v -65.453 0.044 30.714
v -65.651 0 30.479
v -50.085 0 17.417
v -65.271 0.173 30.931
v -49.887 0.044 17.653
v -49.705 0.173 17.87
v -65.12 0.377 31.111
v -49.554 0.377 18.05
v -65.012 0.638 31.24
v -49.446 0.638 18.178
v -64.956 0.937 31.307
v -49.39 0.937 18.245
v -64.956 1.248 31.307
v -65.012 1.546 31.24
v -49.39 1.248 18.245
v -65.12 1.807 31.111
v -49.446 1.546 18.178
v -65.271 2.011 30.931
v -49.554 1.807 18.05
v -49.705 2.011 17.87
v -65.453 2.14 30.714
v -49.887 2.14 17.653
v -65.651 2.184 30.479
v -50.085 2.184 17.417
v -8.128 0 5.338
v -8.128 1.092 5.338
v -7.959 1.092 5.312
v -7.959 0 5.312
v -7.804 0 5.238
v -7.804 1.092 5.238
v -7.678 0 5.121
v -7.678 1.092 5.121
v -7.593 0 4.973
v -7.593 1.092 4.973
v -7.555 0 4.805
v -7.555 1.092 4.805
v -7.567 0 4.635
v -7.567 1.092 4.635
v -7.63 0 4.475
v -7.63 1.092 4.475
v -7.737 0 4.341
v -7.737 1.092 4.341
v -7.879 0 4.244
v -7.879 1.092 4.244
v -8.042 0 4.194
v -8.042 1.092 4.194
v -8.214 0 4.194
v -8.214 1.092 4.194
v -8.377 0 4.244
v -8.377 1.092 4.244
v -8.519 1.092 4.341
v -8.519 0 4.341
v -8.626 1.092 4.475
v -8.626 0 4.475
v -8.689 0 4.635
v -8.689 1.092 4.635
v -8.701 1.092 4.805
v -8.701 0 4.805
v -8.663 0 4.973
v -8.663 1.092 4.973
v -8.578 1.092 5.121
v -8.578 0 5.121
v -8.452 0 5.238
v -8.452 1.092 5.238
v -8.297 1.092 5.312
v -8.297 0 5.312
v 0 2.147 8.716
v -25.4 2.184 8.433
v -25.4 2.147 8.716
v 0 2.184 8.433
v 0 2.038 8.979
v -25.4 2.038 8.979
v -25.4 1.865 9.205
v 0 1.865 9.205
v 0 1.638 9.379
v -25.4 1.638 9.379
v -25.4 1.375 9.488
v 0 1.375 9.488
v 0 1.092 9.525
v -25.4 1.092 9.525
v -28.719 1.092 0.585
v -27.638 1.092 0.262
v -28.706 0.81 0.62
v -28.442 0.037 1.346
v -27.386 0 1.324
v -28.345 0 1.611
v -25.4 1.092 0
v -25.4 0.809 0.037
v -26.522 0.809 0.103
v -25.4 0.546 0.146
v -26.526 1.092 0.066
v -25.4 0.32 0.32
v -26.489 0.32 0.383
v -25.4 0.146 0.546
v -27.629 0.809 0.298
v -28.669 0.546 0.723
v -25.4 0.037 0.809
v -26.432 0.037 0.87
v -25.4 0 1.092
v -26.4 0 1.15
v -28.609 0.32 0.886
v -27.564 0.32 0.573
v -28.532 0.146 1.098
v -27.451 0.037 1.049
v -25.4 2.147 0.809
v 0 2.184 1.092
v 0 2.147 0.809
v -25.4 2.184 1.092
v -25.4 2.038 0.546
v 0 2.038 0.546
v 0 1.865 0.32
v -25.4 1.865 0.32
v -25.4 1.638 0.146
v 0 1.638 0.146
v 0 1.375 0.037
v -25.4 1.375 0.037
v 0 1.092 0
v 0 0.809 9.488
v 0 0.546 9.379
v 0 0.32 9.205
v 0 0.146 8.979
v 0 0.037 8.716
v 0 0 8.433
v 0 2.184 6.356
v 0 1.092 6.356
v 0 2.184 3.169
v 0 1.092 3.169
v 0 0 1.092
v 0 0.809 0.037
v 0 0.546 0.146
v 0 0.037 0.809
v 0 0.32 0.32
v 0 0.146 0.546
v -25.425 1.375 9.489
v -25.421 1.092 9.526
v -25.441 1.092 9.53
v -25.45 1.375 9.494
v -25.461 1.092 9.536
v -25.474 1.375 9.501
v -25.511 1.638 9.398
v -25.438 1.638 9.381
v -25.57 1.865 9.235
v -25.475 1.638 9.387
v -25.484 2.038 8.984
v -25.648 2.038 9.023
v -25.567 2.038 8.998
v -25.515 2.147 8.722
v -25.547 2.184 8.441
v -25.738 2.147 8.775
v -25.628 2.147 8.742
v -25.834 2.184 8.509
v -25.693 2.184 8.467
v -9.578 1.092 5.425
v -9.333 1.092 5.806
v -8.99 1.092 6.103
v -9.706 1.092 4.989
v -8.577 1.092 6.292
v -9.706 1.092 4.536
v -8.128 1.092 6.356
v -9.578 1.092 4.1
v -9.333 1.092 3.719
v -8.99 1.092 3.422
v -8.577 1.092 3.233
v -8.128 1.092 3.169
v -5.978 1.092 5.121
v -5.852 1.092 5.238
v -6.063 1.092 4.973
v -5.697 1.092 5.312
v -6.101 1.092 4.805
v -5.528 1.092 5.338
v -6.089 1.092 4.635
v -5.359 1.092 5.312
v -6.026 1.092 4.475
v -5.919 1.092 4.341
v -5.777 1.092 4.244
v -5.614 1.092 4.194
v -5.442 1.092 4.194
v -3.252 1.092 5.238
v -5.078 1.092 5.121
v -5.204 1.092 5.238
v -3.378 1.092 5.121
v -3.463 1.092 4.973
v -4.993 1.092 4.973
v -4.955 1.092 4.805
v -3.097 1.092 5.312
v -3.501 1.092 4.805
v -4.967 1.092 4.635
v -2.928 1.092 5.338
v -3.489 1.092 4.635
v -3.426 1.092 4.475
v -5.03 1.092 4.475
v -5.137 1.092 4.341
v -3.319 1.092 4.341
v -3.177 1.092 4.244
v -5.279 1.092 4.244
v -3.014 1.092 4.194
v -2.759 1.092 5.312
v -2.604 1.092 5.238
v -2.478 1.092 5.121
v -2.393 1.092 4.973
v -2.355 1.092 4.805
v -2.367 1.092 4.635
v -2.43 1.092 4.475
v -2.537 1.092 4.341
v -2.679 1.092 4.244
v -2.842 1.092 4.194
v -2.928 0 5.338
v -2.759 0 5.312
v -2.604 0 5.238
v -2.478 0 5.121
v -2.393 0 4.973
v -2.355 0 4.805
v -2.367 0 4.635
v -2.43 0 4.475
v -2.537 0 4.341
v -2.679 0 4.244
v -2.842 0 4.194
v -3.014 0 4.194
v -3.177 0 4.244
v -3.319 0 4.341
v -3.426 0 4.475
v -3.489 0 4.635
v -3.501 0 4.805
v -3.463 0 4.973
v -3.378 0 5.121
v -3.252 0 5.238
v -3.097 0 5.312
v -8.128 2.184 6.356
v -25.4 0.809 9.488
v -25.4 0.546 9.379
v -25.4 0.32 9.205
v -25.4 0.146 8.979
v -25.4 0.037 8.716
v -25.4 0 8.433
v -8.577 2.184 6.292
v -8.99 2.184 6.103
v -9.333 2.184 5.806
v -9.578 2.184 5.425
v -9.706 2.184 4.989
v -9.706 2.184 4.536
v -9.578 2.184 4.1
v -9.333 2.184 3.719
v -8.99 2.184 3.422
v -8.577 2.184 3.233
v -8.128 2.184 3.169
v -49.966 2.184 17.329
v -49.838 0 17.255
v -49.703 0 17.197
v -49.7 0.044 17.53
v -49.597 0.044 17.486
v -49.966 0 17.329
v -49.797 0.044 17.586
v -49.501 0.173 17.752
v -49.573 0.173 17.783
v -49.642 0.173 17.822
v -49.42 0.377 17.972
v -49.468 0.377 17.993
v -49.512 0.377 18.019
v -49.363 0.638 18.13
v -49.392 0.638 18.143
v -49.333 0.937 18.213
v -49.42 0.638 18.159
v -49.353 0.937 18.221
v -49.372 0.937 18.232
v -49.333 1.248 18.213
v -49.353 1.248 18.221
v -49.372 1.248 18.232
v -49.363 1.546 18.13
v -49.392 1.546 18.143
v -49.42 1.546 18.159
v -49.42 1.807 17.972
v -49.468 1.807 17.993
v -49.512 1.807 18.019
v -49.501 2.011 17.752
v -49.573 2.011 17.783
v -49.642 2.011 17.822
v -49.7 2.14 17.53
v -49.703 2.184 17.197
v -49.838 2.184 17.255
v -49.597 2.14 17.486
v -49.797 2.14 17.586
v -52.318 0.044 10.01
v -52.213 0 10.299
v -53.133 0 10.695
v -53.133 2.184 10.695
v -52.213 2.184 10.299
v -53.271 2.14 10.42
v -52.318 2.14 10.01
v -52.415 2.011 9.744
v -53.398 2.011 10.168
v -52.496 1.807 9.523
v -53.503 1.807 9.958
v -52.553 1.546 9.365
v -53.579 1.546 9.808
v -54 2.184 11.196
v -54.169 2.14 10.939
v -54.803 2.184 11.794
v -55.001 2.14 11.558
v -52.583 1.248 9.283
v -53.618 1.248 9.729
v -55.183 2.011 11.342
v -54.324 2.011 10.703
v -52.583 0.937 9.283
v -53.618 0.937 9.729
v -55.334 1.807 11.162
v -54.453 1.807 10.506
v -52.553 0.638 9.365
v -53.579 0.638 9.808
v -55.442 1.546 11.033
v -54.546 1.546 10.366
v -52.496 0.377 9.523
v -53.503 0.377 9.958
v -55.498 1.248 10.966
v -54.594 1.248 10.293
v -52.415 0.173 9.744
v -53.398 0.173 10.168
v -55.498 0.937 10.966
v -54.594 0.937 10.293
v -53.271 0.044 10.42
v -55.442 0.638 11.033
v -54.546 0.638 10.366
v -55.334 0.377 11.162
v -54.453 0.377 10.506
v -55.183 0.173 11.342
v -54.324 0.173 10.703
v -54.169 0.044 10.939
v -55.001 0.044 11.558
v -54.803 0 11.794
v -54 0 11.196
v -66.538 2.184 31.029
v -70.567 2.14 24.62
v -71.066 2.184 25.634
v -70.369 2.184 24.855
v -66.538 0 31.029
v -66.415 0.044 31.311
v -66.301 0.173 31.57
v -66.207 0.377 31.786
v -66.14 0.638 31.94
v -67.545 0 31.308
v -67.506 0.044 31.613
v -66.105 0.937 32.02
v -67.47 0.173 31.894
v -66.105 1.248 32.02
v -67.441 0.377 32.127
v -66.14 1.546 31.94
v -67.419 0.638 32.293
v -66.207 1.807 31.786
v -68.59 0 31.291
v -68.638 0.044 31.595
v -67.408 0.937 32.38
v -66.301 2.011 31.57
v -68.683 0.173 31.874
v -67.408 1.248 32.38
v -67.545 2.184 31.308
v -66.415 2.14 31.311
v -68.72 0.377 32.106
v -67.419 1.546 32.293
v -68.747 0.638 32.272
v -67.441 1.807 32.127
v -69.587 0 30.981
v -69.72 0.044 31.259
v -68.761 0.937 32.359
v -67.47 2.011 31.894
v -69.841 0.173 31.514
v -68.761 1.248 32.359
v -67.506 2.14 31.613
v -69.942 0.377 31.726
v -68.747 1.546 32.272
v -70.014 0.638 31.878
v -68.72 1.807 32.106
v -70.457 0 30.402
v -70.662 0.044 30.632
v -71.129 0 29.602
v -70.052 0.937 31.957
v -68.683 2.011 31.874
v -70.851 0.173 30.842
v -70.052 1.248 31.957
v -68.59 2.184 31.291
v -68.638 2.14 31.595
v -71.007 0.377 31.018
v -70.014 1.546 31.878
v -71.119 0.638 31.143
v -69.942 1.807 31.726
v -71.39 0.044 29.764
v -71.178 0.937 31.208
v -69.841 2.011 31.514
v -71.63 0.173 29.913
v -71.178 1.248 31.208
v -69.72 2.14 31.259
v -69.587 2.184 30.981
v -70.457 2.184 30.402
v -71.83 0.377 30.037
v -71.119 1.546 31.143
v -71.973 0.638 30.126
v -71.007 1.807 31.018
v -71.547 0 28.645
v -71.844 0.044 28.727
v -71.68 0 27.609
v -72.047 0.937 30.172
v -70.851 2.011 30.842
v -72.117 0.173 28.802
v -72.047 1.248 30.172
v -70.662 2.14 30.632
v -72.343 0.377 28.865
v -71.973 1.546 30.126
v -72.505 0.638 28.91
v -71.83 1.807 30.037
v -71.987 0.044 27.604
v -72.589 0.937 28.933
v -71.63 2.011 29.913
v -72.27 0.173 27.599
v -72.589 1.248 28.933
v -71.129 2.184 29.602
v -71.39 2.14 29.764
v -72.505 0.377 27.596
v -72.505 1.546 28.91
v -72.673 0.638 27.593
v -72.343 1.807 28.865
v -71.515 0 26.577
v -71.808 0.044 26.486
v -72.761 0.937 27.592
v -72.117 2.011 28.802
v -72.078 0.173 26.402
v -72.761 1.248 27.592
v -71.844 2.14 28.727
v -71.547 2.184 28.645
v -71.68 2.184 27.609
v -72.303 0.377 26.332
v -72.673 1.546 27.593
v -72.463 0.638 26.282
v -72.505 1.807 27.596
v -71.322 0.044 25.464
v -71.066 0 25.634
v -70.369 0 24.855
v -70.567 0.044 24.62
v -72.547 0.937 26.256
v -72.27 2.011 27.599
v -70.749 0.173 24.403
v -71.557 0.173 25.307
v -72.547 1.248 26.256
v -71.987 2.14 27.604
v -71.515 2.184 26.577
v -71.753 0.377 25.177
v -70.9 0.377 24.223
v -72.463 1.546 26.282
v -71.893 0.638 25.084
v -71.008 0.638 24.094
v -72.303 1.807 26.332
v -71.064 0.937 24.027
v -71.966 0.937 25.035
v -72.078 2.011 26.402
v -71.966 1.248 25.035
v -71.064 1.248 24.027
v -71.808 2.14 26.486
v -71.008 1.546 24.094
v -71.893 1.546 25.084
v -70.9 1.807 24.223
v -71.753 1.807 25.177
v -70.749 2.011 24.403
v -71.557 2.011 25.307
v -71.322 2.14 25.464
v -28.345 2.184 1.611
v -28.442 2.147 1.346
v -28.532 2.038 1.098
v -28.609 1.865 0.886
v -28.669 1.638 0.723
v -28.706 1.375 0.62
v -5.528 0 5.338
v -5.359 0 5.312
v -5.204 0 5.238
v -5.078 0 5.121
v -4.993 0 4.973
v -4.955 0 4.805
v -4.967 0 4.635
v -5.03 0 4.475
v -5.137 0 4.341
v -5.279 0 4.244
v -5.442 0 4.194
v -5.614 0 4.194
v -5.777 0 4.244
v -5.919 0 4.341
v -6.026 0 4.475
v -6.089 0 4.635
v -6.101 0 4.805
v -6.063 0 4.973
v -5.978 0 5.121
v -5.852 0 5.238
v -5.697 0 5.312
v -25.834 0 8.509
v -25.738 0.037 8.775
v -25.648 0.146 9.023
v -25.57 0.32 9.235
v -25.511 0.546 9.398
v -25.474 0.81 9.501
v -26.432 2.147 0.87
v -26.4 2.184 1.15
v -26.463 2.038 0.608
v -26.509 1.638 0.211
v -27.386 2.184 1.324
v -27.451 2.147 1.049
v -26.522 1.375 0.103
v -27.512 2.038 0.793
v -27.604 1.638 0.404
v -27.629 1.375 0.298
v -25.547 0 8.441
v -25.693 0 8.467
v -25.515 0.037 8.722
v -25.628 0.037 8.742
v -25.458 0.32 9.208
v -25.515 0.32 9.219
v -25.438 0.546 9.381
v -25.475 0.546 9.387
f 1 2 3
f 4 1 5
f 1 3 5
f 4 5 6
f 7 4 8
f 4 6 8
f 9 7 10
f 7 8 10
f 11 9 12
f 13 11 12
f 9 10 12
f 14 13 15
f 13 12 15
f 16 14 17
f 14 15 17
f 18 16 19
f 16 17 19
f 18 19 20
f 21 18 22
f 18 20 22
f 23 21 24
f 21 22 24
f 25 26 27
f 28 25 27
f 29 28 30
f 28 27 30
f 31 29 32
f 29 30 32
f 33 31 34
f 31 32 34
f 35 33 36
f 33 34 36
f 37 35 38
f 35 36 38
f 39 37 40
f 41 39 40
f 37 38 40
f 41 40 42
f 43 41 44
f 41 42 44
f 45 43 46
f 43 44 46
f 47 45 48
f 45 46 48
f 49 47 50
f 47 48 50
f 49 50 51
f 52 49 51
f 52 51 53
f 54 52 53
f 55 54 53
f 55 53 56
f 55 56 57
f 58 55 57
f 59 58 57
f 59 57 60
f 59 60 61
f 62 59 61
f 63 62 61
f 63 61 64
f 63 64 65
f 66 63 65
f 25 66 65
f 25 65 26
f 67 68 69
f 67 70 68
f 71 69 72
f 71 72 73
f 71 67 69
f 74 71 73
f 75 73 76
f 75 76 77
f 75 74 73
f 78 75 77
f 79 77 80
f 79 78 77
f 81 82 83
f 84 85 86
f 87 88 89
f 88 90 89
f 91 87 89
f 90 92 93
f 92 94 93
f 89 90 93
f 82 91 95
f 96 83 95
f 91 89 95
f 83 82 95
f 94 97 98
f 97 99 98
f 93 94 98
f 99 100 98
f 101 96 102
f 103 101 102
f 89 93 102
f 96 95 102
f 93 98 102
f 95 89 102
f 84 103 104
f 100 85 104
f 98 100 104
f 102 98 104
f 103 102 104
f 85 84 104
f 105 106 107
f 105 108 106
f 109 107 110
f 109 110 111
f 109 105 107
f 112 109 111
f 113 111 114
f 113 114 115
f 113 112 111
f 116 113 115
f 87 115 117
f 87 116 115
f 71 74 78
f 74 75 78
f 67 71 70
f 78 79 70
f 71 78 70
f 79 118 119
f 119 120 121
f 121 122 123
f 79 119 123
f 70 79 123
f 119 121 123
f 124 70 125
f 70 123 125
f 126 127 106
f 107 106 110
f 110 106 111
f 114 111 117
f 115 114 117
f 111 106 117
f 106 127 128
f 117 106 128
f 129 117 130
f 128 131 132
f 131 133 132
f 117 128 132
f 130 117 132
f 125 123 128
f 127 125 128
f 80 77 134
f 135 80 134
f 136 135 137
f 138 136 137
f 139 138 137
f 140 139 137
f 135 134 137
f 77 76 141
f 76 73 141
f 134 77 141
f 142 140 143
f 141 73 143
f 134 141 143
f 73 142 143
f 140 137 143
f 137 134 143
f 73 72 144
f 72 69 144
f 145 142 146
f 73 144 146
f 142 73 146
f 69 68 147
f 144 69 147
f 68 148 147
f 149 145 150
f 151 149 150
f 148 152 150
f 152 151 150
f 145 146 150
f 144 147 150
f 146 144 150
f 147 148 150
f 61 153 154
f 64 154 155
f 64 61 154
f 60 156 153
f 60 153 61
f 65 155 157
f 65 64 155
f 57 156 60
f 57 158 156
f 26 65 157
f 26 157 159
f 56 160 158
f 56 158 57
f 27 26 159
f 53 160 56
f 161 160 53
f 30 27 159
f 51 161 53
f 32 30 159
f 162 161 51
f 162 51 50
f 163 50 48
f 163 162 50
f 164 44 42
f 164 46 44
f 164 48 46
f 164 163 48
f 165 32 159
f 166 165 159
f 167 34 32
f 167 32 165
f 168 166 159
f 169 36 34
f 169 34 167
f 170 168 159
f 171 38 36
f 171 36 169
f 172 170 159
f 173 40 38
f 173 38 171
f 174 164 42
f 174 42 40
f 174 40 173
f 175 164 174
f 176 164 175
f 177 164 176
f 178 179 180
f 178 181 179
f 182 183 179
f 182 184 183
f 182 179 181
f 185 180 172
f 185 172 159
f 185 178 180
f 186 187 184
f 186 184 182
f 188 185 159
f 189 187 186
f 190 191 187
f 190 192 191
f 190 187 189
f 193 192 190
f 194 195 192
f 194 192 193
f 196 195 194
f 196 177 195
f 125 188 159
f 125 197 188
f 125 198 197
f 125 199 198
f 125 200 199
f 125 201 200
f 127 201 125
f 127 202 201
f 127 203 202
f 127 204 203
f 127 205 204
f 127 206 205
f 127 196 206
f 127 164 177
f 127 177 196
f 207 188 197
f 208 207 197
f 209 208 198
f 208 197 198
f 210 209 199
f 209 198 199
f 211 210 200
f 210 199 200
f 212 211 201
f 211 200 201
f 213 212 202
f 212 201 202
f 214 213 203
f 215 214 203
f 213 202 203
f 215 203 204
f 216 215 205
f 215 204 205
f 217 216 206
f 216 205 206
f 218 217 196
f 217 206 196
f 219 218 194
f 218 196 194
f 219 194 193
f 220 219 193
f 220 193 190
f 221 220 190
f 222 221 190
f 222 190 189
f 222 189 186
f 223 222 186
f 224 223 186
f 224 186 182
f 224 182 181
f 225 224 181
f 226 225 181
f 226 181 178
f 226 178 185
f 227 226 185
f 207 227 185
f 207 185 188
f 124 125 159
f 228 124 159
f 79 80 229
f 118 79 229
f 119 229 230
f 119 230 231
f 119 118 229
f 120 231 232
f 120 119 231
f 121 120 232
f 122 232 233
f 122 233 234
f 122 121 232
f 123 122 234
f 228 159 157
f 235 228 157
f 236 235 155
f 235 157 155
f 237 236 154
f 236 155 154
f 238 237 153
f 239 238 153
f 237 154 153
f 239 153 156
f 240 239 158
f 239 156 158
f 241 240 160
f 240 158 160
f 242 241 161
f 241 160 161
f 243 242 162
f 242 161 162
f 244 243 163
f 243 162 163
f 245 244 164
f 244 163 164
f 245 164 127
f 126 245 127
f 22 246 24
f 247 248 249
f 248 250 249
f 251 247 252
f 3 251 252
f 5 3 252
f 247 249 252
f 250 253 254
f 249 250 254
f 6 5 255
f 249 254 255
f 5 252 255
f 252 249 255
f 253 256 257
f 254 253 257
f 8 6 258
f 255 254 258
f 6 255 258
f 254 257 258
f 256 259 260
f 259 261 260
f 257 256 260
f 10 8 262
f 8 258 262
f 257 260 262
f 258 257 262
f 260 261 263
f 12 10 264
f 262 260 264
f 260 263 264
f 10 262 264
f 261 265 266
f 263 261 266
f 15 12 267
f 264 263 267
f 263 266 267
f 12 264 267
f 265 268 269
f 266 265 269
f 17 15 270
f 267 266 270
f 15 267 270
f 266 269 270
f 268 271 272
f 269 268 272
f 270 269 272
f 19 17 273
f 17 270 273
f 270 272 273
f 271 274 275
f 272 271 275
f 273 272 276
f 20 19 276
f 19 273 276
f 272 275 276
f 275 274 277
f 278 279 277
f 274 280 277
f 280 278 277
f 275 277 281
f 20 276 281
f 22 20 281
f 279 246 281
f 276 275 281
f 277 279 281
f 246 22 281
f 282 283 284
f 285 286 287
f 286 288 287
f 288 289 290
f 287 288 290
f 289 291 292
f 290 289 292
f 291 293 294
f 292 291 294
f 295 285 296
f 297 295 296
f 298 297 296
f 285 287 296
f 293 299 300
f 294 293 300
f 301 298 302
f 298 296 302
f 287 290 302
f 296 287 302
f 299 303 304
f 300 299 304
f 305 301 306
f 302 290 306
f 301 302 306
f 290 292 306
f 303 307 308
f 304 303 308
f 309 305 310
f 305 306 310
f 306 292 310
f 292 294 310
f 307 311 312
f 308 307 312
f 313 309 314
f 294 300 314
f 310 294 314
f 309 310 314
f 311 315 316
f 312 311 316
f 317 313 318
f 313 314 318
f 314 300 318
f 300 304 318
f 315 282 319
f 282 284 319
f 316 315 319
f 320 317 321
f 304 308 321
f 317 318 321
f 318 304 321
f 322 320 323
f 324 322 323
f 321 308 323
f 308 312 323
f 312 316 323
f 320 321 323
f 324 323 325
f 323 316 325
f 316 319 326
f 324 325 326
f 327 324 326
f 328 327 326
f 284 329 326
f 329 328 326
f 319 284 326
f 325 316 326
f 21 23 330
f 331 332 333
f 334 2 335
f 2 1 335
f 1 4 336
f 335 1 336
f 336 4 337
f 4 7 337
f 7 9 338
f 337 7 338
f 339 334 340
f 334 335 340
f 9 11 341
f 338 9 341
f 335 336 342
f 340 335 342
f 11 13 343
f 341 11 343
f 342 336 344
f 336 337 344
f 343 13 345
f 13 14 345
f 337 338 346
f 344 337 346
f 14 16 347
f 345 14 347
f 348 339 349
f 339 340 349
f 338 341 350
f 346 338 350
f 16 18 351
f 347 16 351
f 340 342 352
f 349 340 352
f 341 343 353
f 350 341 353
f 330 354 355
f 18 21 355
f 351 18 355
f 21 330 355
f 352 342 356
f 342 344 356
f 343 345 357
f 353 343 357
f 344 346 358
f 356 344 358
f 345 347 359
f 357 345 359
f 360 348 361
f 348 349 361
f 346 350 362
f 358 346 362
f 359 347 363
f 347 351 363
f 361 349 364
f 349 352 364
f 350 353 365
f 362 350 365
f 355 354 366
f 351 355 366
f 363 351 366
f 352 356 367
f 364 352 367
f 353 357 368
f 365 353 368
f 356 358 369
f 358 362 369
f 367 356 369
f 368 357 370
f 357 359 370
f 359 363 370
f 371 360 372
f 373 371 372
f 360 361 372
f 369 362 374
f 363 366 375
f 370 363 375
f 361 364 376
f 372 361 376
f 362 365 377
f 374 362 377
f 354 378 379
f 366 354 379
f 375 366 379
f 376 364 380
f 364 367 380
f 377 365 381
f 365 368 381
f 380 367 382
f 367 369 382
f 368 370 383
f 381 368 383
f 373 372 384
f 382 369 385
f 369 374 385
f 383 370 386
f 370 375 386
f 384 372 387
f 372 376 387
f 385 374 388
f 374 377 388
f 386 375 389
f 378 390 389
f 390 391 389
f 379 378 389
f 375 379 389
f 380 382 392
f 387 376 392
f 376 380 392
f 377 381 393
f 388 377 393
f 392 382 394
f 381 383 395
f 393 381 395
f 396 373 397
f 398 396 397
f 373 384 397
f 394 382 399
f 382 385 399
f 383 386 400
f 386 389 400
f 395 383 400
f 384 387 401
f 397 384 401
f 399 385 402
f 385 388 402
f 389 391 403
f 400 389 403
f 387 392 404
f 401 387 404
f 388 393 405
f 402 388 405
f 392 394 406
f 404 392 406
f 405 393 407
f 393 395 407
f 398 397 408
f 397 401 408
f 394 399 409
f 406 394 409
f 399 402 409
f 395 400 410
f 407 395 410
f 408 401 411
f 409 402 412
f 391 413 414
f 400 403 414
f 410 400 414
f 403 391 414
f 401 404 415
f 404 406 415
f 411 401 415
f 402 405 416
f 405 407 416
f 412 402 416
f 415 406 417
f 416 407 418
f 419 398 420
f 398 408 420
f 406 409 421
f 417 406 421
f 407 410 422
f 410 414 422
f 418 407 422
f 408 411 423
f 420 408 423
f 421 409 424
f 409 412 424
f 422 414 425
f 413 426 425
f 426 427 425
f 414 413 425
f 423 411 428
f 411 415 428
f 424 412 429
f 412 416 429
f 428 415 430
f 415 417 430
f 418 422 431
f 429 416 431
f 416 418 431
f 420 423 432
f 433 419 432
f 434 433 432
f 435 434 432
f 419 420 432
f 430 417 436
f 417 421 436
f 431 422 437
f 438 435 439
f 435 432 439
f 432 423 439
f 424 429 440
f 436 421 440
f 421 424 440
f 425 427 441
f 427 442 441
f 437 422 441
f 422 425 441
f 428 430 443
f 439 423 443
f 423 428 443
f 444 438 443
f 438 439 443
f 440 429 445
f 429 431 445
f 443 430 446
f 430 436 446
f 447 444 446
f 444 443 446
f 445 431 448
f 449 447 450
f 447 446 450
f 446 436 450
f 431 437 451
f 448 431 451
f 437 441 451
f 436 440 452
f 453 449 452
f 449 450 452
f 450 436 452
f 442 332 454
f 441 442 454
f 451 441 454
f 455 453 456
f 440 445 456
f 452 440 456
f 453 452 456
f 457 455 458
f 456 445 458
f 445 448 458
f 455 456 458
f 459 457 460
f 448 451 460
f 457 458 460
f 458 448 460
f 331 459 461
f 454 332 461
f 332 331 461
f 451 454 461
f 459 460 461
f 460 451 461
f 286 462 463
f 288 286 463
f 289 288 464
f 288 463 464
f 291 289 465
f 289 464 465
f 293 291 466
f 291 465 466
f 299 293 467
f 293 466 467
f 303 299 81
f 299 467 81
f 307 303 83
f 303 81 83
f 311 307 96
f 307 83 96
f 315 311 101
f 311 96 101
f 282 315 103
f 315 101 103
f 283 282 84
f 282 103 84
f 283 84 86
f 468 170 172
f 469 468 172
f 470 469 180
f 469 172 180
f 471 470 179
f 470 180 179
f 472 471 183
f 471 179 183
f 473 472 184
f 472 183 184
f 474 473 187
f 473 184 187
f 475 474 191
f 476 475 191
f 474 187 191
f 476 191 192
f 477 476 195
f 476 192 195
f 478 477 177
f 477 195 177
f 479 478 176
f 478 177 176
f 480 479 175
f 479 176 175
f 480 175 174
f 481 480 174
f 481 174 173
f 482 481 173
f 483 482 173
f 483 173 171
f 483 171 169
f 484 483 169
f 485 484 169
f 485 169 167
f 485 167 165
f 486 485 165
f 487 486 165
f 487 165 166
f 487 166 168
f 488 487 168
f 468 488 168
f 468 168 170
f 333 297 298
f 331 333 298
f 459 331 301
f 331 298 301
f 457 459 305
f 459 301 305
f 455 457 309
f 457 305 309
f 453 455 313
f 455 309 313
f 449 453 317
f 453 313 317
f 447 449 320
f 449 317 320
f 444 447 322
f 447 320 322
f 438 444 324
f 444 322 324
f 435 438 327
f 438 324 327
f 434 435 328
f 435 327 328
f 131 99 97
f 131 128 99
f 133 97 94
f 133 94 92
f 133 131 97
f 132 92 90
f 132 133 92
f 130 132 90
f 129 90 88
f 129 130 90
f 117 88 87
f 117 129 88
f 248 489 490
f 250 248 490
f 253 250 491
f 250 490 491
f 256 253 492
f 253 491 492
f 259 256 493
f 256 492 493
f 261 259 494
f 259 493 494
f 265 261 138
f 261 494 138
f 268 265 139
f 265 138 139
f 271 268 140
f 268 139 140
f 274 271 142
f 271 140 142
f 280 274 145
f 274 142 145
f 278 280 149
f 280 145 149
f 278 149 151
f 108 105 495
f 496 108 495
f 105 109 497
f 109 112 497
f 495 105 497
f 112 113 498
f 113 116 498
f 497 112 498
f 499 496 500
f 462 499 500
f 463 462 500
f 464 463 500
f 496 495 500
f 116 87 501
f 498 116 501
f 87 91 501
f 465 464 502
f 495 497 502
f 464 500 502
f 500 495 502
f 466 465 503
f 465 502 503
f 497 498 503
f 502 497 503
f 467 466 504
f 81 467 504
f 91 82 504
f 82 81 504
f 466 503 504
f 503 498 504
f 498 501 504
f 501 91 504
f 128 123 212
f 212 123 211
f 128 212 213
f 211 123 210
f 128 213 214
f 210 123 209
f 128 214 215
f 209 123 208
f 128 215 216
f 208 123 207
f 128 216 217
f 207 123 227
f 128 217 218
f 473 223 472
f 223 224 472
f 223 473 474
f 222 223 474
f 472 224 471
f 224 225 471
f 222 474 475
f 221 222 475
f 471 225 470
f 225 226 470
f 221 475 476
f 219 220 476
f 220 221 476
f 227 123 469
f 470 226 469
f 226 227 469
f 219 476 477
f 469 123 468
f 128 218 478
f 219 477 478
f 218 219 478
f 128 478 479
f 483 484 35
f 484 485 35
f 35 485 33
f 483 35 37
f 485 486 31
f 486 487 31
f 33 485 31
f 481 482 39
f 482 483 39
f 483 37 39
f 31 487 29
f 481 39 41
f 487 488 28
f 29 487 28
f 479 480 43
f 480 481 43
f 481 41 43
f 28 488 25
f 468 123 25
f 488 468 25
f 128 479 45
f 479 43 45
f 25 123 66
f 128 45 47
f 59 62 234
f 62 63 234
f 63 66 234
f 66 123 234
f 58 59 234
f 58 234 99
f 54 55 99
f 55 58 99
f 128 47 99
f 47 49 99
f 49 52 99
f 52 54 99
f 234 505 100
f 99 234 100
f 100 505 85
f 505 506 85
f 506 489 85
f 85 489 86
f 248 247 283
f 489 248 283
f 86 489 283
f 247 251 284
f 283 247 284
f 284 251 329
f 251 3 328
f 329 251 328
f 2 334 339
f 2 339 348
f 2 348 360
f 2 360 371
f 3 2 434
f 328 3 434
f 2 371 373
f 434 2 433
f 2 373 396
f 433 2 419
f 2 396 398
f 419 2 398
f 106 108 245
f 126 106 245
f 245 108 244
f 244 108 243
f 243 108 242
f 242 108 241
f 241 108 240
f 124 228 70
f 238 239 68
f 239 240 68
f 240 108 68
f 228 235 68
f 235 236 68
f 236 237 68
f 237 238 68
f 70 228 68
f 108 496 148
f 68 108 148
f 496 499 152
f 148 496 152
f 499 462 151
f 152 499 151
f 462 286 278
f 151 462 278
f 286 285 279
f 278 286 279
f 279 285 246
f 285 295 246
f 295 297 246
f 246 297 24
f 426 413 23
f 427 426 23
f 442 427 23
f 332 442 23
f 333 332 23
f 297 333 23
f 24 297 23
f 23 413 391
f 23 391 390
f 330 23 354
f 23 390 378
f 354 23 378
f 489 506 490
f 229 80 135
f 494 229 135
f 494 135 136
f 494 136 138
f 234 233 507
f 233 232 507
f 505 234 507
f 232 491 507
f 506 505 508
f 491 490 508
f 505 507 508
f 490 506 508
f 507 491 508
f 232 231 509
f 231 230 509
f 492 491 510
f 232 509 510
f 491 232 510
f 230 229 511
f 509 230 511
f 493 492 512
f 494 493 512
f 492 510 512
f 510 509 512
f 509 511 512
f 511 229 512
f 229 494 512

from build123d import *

# Parameters (mm, degrees)
SKETCH1_W           = 25.4
SKETCH1_H           = 9.525
BOSS_EXTRUDE1_DEPTH = 1.0922
BOSS_EXTRUDE2_DEPTH = 1.0922
FILLET1_R           = 1.0922
SKETCH3_R           = 0.575
CUT_EXTRUDE1_DEPTH  = 28.149190151
REVOLVE1_ANGLE      = 20
BOSS_EXTRUDE3_DEPTH = 25.4
REVOLVE2_ANGLE      = 20
BOSS_EXTRUDE4_DEPTH = 20.32
REVOLVE3_ANGLE      = 180


with BuildPart() as part:
    # Sketch1 → Boss-Extrude1 (new body)
    with BuildSketch(Plane(origin=(0, 0, 0), x_dir=(1, 0, 0), z_dir=(0, 1, 0))):
        with Locations((-12.7, -4.7625)):
            Rectangle(SKETCH1_W, SKETCH1_H)
    extrude(amount=BOSS_EXTRUDE1_DEPTH)

    # Sketch2 → Boss-Extrude2 (add)
    with BuildSketch(Plane(origin=(0, 1.0922, 0), x_dir=(1, 0, 0), z_dir=(0, 1, 0))):
        with BuildLine():
            Line((-8.128, -3.16865), (0, -3.16865))
            Line((0, -3.16865), (0, 0))
            Line((0, 0), (-25.4, 0))
            Line((-25.4, 0), (-25.4, -9.525))
            Line((-25.4, -9.525), (0, -9.525))
            Line((0, -9.525), (0, -6.35635))
            Line((0, -6.35635), (-8.128, -6.35635))
            ThreePointArc((-8.128, -6.35635), (-9.72185, -4.7625), (-8.128, -3.16865))
        make_face()
    extrude(amount=BOSS_EXTRUDE2_DEPTH)

    # Fillet1
    fillet1_edges = [part.edges().sort_by_distance(p)[0] for p in [
        (-12.7, 0, 0),
        (-12.7, 2.1844, 0),
        (-12.7, 0, 9.525),
        (-12.7, 2.1844, 9.525),
    ]]
    fillet(fillet1_edges, radius=FILLET1_R - 0.0001)  # a hair under: the kernel refuses the full size

    # Sketch3 → Cut-Extrude1 (cut, through all)
    with BuildSketch(Plane(origin=(0, 1.0922, 0), x_dir=(1, 0, 0), z_dir=(0, 1, 0))):
        with Locations(Location((-8.128, -4.7625, 0), (0, 0, 270))):
            Circle(SKETCH3_R)
        with Locations(Location((-5.528, -4.7625, 0), (0, 0, 270))):
            Circle(SKETCH3_R)
        with Locations(Location((-2.928, -4.7625, 0), (0, 0, 270))):
            Circle(SKETCH3_R)
    extrude(amount=-CUT_EXTRUDE1_DEPTH, mode=Mode.SUBTRACT)

    # Sketch5 → Revolve1 (revolve)
    with BuildSketch(Plane.ZY.offset(25.4)):
        with BuildLine():
            Line((1.0922, 0), (8.4328, 0))
            ThreePointArc((8.4328, 0), (9.205102026, 0.319897974), (9.525, 1.0922))
            ThreePointArc((9.525, 1.0922), (9.205102026, 1.864502026), (8.4328, 2.1844))
            Line((8.4328, 2.1844), (1.0922, 2.1844))
            ThreePointArc((1.0922, 2.1844), (0.319897974, 1.864502026), (0, 1.0922))
            ThreePointArc((0, 1.0922), (0.319897974, 0.319897974), (1.0922, 0))
        make_face()
    revolve(axis=Axis((-25.4, 2.1844, 9.7028), (0, 1, 0)), revolution_arc=REVOLVE1_ANGLE)

    # Sketch7 → Boss-Extrude3 (add)
    with BuildSketch(Plane(origin=(-25.547184237, 0, 9.298414632), x_dir=(0.34202014332566943, 0, 0.9396926207859082), z_dir=(-0.9396926207859082, 0, 0.34202014332566943))):
        with BuildLine():
            Line((-8.18026208, 0), (-0.83966208, 0))
            ThreePointArc((-0.83966208, 0), (0.25253792, 1.0922), (-0.83966208, 2.1844))
            Line((-0.83966208, 2.1844), (-8.18026208, 2.1844))
            ThreePointArc((-8.18026208, 2.1844), (-9.27246208, 1.0922), (-8.18026208, 0))
        make_face()
    extrude(amount=BOSS_EXTRUDE3_DEPTH)

    # Sketch9 → Revolve2 (revolve)
    with BuildSketch(Plane(origin=(-49.415376805, 0, 17.985726272), x_dir=(0.34202014332566943, 0, 0.9396926207859082), z_dir=(-0.9396926207859082, 0, 0.34202014332566943))):
        with BuildLine():
            Line((-8.18026208, 0), (-0.83966208, 0))
            ThreePointArc((-0.83966208, 0), (0.25253792, 1.0922), (-0.83966208, 2.1844))
            Line((-0.83966208, 2.1844), (-8.18026208, 2.1844))
            ThreePointArc((-8.18026208, 2.1844), (-9.27246208, 1.0922), (-8.18026208, 0))
        make_face()
    revolve(axis=Axis((-49.268192568, 2.1844, 18.39011164), (0, 1, 0)), revolution_arc=REVOLVE2_ANGLE)

    # Sketch10 → Boss-Extrude4 (add)
    with BuildSketch(Plane(origin=(-37.967124473, 0, 31.858200142), x_dir=(0.6427876096865406, 0, 0.7660444431189771), z_dir=(-0.766044443118977, 0, 0.6427876096865405))):
        with BuildLine():
            Line((-26.191940904, 0), (-18.851340904, 0))
            ThreePointArc((-18.851340904, 0), (-17.759140904, 1.0922), (-18.851340904, 2.1844))
            Line((-18.851340904, 2.1844), (-26.191940904, 2.1844))
            ThreePointArc((-26.191940904, 2.1844), (-27.284140904, 1.0922), (-26.191940904, 0))
        make_face()
    extrude(amount=BOSS_EXTRUDE4_DEPTH)

    # Sketch11 → Revolve3 (revolve)
    with BuildSketch(Plane(origin=(-53.533147557, 0, 44.919644371), x_dir=(0.6427876096865407, 0, 0.7660444431189769), z_dir=(-0.7660444431189769, 0, 0.6427876096865407))):
        with BuildLine():
            Line((-18.851340904, 2.1844), (-22.521640904, 2.1844))
            Line((-22.521640904, 2.1844), (-22.521640904, 0))
            Line((-22.521640904, 0), (-18.851340904, 0))
            ThreePointArc((-18.851340904, 0), (-17.759140904, 1.0922), (-18.851340904, 2.1844))
        make_face()
    revolve(axis=Axis((-68.00977928, 2.1844, 27.667066507), (0, -1, 0)), revolution_arc=REVOLVE3_ANGLE)


solid = part.part
